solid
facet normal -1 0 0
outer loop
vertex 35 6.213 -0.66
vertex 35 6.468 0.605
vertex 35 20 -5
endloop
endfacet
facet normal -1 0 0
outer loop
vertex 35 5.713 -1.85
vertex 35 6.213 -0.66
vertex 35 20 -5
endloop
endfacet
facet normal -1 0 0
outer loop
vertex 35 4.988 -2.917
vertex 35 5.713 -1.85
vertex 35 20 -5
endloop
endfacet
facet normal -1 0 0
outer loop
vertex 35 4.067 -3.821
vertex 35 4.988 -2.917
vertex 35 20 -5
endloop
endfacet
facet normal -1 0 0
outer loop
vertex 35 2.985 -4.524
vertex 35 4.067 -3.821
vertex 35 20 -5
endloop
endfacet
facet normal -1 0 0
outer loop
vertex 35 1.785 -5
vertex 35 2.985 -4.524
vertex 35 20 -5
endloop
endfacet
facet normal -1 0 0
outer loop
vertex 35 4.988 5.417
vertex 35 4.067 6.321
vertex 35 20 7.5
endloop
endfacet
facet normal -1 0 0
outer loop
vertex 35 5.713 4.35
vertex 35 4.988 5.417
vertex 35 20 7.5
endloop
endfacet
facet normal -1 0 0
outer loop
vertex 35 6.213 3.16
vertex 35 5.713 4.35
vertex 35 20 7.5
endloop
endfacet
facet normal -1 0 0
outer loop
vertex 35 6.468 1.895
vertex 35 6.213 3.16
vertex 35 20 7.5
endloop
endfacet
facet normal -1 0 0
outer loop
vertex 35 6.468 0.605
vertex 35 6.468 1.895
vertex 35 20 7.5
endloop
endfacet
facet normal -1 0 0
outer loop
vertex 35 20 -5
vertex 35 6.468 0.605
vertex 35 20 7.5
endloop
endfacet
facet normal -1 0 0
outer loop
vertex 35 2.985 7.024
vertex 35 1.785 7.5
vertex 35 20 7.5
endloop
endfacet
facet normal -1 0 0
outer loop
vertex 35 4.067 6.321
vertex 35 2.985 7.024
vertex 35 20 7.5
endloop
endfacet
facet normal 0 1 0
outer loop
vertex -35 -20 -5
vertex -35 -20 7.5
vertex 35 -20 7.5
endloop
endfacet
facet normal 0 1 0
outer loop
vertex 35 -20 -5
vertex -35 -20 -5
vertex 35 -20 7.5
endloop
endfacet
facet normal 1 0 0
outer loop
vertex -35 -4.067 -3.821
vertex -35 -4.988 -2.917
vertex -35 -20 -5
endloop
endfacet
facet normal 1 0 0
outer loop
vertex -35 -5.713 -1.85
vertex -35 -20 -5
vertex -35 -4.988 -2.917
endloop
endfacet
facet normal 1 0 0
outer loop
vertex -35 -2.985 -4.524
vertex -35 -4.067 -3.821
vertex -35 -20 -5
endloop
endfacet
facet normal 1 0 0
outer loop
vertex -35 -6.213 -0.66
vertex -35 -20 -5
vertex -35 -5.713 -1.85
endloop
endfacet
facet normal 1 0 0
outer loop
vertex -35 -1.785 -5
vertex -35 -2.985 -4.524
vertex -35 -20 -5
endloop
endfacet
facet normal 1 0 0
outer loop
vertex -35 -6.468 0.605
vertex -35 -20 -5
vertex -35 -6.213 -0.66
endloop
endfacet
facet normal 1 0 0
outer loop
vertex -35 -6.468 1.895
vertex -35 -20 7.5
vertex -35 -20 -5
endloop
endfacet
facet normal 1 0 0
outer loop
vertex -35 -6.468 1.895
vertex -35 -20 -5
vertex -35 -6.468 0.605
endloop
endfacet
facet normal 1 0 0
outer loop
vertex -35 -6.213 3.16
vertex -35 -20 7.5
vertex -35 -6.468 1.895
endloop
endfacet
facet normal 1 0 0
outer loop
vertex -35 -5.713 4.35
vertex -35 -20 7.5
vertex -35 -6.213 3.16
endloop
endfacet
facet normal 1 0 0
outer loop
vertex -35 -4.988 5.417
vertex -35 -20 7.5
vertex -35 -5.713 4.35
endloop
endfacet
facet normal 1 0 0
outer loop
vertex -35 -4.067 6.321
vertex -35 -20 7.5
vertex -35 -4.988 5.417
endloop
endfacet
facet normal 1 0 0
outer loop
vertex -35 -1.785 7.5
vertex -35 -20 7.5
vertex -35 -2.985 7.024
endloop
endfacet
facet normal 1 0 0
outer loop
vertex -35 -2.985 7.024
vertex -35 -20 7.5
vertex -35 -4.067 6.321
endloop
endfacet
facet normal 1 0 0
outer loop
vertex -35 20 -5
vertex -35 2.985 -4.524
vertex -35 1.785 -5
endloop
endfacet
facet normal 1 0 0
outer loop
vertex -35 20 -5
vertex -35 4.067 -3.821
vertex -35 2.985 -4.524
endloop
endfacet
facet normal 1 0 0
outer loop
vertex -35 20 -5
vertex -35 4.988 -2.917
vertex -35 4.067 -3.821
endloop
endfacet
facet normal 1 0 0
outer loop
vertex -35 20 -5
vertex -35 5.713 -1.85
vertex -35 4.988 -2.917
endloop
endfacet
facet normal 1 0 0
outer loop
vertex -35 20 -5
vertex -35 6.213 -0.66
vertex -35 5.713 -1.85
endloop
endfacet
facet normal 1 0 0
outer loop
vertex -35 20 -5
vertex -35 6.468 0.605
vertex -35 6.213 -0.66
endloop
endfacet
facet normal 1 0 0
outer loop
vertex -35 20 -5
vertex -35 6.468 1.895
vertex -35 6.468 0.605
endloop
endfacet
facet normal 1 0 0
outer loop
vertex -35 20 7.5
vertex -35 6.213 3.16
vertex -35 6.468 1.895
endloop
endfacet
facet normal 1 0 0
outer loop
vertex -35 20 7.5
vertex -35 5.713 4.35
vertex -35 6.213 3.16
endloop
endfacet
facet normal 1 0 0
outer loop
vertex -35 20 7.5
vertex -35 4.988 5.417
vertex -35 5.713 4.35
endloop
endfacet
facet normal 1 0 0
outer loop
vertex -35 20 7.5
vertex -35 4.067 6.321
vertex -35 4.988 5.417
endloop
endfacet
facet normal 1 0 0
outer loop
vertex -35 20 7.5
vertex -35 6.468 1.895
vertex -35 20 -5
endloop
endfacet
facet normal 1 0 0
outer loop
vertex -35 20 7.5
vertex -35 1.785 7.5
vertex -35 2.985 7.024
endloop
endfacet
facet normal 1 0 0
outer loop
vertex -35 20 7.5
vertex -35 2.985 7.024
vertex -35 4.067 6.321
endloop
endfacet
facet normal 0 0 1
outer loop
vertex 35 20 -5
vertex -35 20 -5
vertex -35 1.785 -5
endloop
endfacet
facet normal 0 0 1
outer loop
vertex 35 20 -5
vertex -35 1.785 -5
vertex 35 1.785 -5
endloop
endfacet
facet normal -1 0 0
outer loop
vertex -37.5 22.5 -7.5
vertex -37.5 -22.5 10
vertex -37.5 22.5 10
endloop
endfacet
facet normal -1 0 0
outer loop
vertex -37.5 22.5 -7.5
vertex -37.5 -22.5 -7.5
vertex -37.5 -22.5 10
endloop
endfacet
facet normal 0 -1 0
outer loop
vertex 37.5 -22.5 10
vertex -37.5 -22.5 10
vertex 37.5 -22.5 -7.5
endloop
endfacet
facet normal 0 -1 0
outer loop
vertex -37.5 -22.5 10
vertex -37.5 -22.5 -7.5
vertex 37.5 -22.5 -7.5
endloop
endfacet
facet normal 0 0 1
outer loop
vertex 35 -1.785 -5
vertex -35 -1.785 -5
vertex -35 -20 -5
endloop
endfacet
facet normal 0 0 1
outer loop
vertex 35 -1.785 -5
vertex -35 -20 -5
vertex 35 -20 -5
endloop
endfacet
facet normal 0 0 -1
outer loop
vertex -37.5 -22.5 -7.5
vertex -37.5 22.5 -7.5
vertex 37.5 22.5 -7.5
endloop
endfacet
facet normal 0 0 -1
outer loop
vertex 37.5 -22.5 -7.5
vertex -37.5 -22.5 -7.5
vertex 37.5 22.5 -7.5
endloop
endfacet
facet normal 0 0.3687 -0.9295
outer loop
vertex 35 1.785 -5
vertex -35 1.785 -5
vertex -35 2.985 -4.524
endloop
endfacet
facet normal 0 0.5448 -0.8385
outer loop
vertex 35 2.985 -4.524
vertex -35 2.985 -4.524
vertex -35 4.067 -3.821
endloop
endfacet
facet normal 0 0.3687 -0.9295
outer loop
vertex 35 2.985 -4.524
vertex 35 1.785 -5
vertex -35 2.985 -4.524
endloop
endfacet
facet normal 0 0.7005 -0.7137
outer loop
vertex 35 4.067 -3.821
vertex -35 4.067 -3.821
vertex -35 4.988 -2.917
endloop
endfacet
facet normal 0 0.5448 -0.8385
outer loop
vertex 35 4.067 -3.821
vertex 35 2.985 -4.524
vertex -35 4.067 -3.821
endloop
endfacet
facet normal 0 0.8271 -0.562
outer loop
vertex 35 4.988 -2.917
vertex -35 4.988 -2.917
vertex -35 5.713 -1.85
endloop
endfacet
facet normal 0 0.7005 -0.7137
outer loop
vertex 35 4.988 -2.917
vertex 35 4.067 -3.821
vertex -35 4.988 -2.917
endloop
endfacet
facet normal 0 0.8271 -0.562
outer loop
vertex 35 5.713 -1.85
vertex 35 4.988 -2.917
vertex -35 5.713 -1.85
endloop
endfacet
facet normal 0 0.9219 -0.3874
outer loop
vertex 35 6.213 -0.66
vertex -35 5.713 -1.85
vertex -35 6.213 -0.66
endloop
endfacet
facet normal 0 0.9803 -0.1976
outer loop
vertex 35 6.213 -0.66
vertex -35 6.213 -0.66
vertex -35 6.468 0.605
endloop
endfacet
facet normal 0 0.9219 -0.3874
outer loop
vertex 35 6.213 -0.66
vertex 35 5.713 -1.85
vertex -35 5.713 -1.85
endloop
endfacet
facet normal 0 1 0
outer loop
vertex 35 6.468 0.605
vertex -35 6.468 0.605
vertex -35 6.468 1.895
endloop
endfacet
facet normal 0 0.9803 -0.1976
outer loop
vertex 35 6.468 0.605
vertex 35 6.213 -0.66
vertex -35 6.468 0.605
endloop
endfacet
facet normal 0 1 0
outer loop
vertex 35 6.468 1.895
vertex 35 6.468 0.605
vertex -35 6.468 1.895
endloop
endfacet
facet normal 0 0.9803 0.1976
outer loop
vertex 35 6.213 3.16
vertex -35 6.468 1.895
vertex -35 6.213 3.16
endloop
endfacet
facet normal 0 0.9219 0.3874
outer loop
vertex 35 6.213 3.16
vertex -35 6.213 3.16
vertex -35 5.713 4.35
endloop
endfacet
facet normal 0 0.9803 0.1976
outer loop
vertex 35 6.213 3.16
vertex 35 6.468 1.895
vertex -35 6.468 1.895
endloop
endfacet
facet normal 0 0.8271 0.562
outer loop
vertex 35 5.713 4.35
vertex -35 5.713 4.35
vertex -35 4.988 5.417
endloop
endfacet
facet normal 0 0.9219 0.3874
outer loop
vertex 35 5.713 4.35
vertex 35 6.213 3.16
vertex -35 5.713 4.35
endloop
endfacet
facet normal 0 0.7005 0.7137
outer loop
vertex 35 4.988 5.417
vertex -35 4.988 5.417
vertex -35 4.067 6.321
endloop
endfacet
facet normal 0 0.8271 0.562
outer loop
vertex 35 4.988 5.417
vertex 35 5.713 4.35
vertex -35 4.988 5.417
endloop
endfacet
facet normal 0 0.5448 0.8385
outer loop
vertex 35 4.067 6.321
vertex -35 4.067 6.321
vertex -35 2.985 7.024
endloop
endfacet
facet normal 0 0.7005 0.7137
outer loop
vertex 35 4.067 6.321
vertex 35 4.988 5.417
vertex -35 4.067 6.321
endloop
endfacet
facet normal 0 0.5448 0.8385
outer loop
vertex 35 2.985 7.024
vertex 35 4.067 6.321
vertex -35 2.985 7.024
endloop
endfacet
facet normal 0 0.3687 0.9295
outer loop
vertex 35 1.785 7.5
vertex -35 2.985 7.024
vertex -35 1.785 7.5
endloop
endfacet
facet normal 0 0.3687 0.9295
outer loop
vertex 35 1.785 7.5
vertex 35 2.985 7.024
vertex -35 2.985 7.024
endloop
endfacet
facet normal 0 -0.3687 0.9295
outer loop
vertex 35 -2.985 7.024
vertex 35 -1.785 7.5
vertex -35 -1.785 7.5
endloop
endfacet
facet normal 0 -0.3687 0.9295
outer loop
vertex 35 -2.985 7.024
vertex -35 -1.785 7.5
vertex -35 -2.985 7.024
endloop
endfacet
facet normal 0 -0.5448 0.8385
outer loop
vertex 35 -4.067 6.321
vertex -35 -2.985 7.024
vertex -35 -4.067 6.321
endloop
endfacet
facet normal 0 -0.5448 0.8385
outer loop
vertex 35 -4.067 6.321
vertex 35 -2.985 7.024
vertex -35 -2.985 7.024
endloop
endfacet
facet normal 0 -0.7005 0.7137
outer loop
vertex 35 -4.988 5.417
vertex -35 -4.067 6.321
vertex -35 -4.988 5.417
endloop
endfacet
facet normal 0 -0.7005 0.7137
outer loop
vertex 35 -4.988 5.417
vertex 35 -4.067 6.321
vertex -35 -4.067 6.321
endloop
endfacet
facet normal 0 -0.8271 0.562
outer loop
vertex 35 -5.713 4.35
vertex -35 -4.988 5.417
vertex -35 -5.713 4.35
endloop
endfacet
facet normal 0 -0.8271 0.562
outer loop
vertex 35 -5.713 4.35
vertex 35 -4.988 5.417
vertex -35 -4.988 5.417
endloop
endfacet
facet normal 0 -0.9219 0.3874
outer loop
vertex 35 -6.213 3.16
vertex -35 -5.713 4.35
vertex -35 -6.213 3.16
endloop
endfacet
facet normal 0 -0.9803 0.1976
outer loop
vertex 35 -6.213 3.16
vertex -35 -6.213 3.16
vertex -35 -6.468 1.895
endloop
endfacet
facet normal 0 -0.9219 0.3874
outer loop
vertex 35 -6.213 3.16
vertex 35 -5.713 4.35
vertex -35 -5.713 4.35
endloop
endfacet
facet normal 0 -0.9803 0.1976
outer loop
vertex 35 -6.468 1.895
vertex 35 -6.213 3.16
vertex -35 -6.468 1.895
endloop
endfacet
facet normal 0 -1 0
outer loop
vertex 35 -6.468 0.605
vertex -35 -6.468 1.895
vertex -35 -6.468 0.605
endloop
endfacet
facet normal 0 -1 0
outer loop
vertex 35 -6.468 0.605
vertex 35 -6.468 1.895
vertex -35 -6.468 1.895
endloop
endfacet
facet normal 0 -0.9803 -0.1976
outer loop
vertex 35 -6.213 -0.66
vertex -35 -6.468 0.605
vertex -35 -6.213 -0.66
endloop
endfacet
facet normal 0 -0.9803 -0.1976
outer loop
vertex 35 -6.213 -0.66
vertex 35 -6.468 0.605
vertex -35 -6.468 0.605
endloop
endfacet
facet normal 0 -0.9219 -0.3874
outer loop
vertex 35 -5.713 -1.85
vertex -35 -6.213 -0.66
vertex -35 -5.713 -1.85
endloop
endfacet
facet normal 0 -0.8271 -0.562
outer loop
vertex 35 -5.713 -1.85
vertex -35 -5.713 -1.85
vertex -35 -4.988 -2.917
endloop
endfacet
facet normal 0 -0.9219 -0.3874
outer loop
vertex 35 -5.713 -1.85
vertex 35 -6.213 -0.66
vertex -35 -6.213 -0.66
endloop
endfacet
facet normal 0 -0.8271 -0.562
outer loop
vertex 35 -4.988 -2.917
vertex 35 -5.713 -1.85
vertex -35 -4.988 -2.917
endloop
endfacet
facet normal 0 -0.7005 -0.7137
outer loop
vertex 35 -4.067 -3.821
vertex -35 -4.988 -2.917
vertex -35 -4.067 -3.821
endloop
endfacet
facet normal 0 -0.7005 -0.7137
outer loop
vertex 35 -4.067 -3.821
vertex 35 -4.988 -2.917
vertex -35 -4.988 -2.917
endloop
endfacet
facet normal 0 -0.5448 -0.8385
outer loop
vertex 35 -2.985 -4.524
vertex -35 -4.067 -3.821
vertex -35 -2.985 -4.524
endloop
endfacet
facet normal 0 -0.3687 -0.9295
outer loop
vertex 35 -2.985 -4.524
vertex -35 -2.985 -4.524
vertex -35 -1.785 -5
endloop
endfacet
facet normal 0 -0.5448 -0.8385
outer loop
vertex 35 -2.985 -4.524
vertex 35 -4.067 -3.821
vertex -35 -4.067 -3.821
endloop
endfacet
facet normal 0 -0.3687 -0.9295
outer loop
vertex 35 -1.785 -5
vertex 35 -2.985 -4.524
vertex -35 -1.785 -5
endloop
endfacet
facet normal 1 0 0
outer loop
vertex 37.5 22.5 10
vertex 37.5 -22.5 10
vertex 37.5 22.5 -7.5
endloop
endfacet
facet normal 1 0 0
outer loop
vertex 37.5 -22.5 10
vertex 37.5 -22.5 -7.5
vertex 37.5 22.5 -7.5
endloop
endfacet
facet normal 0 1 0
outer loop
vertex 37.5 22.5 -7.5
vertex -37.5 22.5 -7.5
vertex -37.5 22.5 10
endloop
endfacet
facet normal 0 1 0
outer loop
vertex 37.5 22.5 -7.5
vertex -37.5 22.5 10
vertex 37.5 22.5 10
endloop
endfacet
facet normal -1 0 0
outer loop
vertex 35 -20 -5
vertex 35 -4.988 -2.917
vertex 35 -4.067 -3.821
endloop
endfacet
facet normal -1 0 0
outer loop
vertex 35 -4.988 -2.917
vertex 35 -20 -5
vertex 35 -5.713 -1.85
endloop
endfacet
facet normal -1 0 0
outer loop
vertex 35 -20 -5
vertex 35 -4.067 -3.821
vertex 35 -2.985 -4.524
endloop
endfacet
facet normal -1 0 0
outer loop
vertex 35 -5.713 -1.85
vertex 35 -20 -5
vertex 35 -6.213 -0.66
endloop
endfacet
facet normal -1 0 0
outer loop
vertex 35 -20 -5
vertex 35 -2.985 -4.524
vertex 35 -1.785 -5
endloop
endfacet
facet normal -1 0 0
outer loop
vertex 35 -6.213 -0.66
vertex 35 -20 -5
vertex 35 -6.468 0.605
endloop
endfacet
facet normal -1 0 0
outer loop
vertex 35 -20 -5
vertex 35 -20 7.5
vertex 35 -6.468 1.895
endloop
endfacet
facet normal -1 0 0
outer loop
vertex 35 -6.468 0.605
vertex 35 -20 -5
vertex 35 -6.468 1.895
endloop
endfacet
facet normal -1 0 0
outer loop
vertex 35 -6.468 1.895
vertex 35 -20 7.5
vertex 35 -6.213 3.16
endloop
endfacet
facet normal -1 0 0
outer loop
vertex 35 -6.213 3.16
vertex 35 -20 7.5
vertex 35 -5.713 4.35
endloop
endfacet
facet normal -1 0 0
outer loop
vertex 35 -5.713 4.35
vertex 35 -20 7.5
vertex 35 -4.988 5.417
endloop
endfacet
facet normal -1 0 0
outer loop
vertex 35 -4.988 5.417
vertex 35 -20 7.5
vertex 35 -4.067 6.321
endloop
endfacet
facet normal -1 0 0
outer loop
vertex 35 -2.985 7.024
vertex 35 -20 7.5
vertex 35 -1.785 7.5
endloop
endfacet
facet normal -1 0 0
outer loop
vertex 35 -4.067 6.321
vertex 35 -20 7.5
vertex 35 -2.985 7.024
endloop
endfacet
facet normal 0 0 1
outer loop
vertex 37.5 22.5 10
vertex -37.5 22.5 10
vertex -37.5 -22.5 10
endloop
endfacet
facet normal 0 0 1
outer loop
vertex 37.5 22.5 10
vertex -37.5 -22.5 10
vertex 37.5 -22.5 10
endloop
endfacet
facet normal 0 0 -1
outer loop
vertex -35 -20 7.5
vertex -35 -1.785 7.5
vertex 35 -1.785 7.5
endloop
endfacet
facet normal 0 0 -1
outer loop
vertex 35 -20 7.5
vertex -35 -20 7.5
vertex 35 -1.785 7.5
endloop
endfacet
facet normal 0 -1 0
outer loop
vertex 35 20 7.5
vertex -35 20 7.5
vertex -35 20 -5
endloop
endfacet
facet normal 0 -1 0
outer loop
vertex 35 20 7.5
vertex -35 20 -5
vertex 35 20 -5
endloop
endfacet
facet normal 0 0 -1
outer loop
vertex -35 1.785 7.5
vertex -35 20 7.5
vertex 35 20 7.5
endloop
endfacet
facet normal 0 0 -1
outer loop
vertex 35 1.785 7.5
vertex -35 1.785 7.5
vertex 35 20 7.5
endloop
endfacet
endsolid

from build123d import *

# Parameters (mm, degrees)
F0_W     = 75
F0_H     = 45
F1_DEPTH = 7.5
F2_T     = -2.5
F3_W     = 75
F3_H     = 45
F4_DEPTH = 2.5
F5_R     = 6.5
F6_DEPTH = 37


with BuildPart() as f1:
    # F0 (on Top) → F1 (new body, symmetric)
    with BuildSketch(Plane.XY):
        Rectangle(F0_W, F0_H)
    extrude(amount=F1_DEPTH, both=True)

    # F2
    f2_openings = [f1.faces().sort_by_distance(p)[0] for p in [
        (0, 0, 7.5),
    ]]
    offset(amount=F2_T, openings=f2_openings)

    # F3 (on face) → F4 (join)
    with BuildSketch(Plane.XY.offset(7.5)):
        Rectangle(F3_W, F3_H)
    extrude(amount=F4_DEPTH)

    # F5 (on Right) → F6 (join, symmetric)
    with BuildSketch(Plane.YZ):
        with Locations((0, 1.25)):
            Circle(F5_R)
    extrude(amount=F6_DEPTH, both=True)


solid = f1.part
